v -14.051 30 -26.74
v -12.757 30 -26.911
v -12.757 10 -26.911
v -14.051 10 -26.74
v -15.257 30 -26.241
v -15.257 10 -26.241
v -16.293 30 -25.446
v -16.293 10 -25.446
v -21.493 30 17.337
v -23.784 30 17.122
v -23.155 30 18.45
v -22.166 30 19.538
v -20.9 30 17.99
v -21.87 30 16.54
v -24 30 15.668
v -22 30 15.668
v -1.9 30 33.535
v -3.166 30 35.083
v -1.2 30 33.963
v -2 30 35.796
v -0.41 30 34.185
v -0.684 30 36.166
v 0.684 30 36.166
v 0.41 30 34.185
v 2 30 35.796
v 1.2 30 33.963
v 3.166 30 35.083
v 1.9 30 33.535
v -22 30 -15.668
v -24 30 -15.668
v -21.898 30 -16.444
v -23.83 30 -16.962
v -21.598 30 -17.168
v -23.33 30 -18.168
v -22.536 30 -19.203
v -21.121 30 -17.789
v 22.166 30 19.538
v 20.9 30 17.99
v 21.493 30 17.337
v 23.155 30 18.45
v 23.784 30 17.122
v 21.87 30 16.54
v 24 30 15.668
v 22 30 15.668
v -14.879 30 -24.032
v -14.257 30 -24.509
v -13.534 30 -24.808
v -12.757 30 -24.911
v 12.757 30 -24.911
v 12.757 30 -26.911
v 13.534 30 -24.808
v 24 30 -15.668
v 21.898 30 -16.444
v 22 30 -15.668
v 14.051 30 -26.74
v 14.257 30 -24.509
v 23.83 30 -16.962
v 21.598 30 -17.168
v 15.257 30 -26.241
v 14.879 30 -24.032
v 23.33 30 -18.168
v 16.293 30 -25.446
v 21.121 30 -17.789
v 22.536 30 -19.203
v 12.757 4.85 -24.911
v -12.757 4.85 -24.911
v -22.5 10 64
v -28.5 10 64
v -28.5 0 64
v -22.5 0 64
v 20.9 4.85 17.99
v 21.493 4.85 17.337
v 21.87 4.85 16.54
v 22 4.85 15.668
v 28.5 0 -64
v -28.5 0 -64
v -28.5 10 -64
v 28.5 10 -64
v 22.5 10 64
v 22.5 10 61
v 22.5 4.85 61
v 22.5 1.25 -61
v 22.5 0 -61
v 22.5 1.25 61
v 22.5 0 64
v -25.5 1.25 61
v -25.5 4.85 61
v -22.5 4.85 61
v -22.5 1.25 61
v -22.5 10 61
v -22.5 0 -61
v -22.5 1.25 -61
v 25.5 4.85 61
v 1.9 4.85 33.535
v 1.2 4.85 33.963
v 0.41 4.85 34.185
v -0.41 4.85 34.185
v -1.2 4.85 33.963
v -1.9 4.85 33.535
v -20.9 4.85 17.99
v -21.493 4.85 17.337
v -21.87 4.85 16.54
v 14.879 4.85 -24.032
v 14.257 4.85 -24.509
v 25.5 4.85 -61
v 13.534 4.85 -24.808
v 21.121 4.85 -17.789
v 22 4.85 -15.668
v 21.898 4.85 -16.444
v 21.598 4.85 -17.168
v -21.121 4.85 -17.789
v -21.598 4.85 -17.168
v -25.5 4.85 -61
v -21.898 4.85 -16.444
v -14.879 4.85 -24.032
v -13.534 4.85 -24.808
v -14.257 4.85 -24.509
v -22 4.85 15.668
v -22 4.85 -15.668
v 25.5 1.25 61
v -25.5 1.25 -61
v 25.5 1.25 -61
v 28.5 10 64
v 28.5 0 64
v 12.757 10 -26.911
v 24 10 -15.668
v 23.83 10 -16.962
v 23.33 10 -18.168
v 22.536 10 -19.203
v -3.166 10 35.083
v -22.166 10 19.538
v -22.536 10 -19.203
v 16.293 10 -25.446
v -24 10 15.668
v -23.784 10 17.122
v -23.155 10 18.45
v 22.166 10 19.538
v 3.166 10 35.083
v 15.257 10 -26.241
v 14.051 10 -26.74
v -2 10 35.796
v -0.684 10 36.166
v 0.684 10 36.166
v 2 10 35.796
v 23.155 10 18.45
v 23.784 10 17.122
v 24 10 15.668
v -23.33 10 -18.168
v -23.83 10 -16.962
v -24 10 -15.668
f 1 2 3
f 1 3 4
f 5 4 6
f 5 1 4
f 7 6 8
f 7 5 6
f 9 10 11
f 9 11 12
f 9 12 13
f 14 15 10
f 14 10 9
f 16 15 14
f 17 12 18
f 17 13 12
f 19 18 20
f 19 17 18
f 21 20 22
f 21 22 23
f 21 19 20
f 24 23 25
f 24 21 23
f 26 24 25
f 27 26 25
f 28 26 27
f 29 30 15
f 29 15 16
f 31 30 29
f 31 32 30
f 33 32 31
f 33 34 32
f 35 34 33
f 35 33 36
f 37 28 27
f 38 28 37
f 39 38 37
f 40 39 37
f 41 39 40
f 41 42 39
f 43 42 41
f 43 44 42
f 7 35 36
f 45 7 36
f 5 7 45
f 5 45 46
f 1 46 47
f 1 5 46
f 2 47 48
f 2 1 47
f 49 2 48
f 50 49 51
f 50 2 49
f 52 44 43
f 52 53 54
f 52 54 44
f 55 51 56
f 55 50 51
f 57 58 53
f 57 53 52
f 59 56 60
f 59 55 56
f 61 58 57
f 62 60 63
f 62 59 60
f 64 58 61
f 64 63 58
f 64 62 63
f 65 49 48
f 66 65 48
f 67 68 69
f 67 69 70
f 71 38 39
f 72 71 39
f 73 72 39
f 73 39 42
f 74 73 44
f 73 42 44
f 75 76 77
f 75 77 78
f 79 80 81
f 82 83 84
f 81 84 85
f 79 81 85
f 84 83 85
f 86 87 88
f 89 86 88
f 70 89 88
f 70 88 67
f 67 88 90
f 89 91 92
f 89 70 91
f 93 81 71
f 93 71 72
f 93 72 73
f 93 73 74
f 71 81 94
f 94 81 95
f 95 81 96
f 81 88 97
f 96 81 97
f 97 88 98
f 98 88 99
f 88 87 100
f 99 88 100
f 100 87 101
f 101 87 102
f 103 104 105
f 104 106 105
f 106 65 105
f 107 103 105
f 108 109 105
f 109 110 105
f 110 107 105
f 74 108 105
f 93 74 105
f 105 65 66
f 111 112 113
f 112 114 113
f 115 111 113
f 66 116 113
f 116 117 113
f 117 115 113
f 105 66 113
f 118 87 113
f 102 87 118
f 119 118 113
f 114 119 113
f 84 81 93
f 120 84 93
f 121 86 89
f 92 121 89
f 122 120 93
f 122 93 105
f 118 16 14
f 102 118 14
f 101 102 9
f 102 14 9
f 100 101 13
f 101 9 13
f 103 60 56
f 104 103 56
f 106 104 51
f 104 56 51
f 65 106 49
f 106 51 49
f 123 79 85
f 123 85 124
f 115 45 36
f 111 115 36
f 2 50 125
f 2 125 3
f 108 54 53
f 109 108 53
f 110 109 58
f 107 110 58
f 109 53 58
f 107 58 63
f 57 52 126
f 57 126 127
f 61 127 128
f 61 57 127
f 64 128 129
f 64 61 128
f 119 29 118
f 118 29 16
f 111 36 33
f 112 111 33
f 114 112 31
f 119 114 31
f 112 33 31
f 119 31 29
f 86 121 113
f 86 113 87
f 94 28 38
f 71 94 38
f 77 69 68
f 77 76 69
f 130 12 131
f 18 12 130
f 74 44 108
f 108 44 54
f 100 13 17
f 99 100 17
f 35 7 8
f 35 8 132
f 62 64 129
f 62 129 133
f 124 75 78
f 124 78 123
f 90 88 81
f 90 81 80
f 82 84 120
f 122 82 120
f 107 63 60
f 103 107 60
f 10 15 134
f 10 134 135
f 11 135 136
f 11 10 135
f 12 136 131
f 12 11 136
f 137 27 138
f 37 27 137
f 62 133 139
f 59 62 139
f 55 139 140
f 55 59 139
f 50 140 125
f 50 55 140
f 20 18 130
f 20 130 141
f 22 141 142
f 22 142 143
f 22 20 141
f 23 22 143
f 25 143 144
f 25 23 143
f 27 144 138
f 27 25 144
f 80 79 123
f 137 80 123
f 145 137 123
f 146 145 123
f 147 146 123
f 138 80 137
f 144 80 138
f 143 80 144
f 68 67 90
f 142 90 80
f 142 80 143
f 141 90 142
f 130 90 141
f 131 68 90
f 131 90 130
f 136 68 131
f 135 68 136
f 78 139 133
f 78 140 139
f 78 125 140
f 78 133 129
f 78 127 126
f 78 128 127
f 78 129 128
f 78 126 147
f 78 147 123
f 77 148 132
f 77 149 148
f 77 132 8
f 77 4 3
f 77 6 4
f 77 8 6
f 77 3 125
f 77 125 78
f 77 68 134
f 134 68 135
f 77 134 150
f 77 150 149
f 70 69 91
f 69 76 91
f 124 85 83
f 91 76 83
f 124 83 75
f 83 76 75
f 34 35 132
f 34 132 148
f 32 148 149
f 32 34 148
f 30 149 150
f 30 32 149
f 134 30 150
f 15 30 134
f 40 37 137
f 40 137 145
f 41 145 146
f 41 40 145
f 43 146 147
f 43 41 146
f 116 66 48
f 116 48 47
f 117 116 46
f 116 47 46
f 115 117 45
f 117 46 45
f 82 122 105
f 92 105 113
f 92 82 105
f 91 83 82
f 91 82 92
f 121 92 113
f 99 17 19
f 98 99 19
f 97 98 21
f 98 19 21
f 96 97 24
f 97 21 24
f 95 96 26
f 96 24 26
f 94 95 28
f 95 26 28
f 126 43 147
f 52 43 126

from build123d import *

# Parameters (mm, degrees)
BOSS_EXTRUDE1_DEPTH = 10
SKETCH2_W           = 3
SKETCH2_H           = 122
BOSS_EXTRUDE2_DEPTH = 1.25
SKETCH3_W           = 6
SKETCH3_H           = 10
BOSS_EXTRUDE3_DEPTH = 3
SKETCH4_W           = 122
SKETCH4_H           = 5.15
BOSS_EXTRUDE4_DEPTH = 52
CUT_EXTRUDE1_DEPTH  = 52
BOSS_EXTRUDE6_START = 20
BOSS_EXTRUDE6_DEPTH = 20


with BuildPart() as part:
    # Sketch1 → Boss-Extrude1 (new body)
    with BuildSketch(Plane(origin=(0, 0, 0), x_dir=(1, 0, 0), z_dir=(0, 1, 0))):
        Polygon((-28.5, 64), (28.5, 64), (28.5, -61), (25.5, -61), (25.5, 61), (-25.5, 61), (-25.5, -61), (-28.5, -61), align=None)
    extrude(amount=BOSS_EXTRUDE1_DEPTH)

    # Sketch2 → Boss-Extrude2 (add)
    with BuildSketch(Plane.XZ):
        with Locations((-24, 0)):
            Rectangle(SKETCH2_W, SKETCH2_H)
        with Locations((24, 0)):
            Rectangle(SKETCH2_W, SKETCH2_H)
    extrude(amount=-BOSS_EXTRUDE2_DEPTH)

    # Sketch3 → Boss-Extrude3 (add)
    with BuildSketch(Plane.XY.offset(61)):
        with Locations((-25.5, 5)):
            Rectangle(SKETCH3_W, SKETCH3_H)
        with Locations((25.5, 5)):
            Rectangle(SKETCH3_W, SKETCH3_H)
    extrude(amount=BOSS_EXTRUDE3_DEPTH)

    # Sketch4 → Boss-Extrude4 (add)
    with BuildSketch(Plane(origin=(-25.5, 0, 0), x_dir=(0, 0, -1), z_dir=(1, 0, 0))):
        with Locations((0, 7.425)):
            Rectangle(SKETCH4_W, SKETCH4_H)
    extrude(amount=BOSS_EXTRUDE4_DEPTH)

    # Sketch5 → Cut-Extrude1 (cut)
    with BuildSketch(Plane(origin=(0, 10, 0), x_dir=(1, 0, 0), z_dir=(0, 1, 0))):
        with BuildLine():
            Line((-22, 15.667860965), (-22, -15.667860965))
            ThreePointArc((-22, -15.667860965), (-21.711009048, -16.952551567), (-20.899713371, -17.989732863))
            Line((-20.899713371, -17.989732863), (-1.899713371, -33.535187408))
            ThreePointArc((-1.899713371, -33.535187408), (0, -34.213315511), (1.899713371, -33.535187408))
            Line((1.899713371, -33.535187408), (20.899713371, -17.989732863))
            ThreePointArc((20.899713371, -17.989732863), (21.711009048, -16.952551567), (22, -15.667860965))
            Line((22, -15.667860965), (22, 15.667860965))
            ThreePointArc((22, 15.667860965), (21.771638598, 16.815911262), (21.121320344, 17.789181309))
            Line((21.121320344, 17.789181309), (14.878679656, 24.031821996))
            ThreePointArc((14.878679656, 24.031821996), (13.90540961, 24.68214025), (12.757359313, 24.910501652))
            Line((12.757359313, 24.910501652), (-12.757359313, 24.910501652))
            ThreePointArc((-12.757359313, 24.910501652), (-13.90540961, 24.68214025), (-14.878679656, 24.031821996))
            Line((-14.878679656, 24.031821996), (-21.121320344, 17.789181309))
            ThreePointArc((-21.121320344, 17.789181309), (-21.771638598, 16.815911262), (-22, 15.667860965))
        make_face()
    extrude(amount=-CUT_EXTRUDE1_DEPTH, mode=Mode.SUBTRACT)

    # Sketch6 → Boss-Extrude6 (add)
    with BuildSketch(Plane(origin=(0, 10, 0), x_dir=(1, 0, 0), z_dir=(0, 1, 0)).offset(BOSS_EXTRUDE6_START)):
        with BuildLine():
            Line((-22.166188951, -19.537647461), (-3.166188951, -35.083102007))
            ThreePointArc((-3.166188951, -35.083102007), (0, -36.213315511), (3.166188951, -35.083102007))
            Line((3.166188951, -35.083102007), (22.166188951, -19.537647461))
            ThreePointArc((22.166188951, -19.537647461), (23.518348413, -17.809011969), (24, -15.667860965))
            Line((24, -15.667860965), (24, 15.667860965))
            ThreePointArc((24, 15.667860965), (23.619397663, 17.581278127), (22.535533906, 19.203394871))
            Line((22.535533906, 19.203394871), (16.292893219, 25.446035558))
            ThreePointArc((16.292893219, 25.446035558), (14.670776475, 26.529899315), (12.757359313, 26.910501652))
            Line((12.757359313, 26.910501652), (-12.757359313, 26.910501652))
            ThreePointArc((-12.757359313, 26.910501652), (-14.670776475, 26.529899315), (-16.292893219, 25.446035558))
            Line((-16.292893219, 25.446035558), (-22.535533906, 19.203394871))
            ThreePointArc((-22.535533906, 19.203394871), (-23.619397663, 17.581278127), (-24, 15.667860965))
            Line((-24, 15.667860965), (-24, -15.667860965))
            ThreePointArc((-24, -15.667860965), (-23.518348413, -17.809011969), (-22.166188951, -19.537647461))
        make_face()
        with BuildLine():
            Line((-20.899713371, -17.989732863), (-1.899713371, -33.535187408))
            ThreePointArc((-1.899713371, -33.535187408), (0, -34.213315511), (1.899713371, -33.535187408))
            Line((1.899713371, -33.535187408), (20.899713371, -17.989732863))
            ThreePointArc((20.899713371, -17.989732863), (21.711009048, -16.952551567), (22, -15.667860965))
            Line((22, -15.667860965), (22, 15.667860965))
            ThreePointArc((22, 15.667860965), (21.771638598, 16.815911262), (21.121320344, 17.789181309))
            Line((21.121320344, 17.789181309), (14.878679656, 24.031821996))
            ThreePointArc((14.878679656, 24.031821996), (13.90540961, 24.68214025), (12.757359313, 24.910501652))
            Line((12.757359313, 24.910501652), (-12.757359313, 24.910501652))
            ThreePointArc((-12.757359313, 24.910501652), (-13.90540961, 24.68214025), (-14.878679656, 24.031821996))
            Line((-14.878679656, 24.031821996), (-21.121320344, 17.789181309))
            ThreePointArc((-21.121320344, 17.789181309), (-21.771638598, 16.815911262), (-22, 15.667860965))
            Line((-22, 15.667860965), (-22, -15.667860965))
            ThreePointArc((-22, -15.667860965), (-21.711009048, -16.952551567), (-20.899713371, -17.989732863))
        make_face(mode=Mode.SUBTRACT)
    extrude(amount=-BOSS_EXTRUDE6_DEPTH)


solid = part.part
